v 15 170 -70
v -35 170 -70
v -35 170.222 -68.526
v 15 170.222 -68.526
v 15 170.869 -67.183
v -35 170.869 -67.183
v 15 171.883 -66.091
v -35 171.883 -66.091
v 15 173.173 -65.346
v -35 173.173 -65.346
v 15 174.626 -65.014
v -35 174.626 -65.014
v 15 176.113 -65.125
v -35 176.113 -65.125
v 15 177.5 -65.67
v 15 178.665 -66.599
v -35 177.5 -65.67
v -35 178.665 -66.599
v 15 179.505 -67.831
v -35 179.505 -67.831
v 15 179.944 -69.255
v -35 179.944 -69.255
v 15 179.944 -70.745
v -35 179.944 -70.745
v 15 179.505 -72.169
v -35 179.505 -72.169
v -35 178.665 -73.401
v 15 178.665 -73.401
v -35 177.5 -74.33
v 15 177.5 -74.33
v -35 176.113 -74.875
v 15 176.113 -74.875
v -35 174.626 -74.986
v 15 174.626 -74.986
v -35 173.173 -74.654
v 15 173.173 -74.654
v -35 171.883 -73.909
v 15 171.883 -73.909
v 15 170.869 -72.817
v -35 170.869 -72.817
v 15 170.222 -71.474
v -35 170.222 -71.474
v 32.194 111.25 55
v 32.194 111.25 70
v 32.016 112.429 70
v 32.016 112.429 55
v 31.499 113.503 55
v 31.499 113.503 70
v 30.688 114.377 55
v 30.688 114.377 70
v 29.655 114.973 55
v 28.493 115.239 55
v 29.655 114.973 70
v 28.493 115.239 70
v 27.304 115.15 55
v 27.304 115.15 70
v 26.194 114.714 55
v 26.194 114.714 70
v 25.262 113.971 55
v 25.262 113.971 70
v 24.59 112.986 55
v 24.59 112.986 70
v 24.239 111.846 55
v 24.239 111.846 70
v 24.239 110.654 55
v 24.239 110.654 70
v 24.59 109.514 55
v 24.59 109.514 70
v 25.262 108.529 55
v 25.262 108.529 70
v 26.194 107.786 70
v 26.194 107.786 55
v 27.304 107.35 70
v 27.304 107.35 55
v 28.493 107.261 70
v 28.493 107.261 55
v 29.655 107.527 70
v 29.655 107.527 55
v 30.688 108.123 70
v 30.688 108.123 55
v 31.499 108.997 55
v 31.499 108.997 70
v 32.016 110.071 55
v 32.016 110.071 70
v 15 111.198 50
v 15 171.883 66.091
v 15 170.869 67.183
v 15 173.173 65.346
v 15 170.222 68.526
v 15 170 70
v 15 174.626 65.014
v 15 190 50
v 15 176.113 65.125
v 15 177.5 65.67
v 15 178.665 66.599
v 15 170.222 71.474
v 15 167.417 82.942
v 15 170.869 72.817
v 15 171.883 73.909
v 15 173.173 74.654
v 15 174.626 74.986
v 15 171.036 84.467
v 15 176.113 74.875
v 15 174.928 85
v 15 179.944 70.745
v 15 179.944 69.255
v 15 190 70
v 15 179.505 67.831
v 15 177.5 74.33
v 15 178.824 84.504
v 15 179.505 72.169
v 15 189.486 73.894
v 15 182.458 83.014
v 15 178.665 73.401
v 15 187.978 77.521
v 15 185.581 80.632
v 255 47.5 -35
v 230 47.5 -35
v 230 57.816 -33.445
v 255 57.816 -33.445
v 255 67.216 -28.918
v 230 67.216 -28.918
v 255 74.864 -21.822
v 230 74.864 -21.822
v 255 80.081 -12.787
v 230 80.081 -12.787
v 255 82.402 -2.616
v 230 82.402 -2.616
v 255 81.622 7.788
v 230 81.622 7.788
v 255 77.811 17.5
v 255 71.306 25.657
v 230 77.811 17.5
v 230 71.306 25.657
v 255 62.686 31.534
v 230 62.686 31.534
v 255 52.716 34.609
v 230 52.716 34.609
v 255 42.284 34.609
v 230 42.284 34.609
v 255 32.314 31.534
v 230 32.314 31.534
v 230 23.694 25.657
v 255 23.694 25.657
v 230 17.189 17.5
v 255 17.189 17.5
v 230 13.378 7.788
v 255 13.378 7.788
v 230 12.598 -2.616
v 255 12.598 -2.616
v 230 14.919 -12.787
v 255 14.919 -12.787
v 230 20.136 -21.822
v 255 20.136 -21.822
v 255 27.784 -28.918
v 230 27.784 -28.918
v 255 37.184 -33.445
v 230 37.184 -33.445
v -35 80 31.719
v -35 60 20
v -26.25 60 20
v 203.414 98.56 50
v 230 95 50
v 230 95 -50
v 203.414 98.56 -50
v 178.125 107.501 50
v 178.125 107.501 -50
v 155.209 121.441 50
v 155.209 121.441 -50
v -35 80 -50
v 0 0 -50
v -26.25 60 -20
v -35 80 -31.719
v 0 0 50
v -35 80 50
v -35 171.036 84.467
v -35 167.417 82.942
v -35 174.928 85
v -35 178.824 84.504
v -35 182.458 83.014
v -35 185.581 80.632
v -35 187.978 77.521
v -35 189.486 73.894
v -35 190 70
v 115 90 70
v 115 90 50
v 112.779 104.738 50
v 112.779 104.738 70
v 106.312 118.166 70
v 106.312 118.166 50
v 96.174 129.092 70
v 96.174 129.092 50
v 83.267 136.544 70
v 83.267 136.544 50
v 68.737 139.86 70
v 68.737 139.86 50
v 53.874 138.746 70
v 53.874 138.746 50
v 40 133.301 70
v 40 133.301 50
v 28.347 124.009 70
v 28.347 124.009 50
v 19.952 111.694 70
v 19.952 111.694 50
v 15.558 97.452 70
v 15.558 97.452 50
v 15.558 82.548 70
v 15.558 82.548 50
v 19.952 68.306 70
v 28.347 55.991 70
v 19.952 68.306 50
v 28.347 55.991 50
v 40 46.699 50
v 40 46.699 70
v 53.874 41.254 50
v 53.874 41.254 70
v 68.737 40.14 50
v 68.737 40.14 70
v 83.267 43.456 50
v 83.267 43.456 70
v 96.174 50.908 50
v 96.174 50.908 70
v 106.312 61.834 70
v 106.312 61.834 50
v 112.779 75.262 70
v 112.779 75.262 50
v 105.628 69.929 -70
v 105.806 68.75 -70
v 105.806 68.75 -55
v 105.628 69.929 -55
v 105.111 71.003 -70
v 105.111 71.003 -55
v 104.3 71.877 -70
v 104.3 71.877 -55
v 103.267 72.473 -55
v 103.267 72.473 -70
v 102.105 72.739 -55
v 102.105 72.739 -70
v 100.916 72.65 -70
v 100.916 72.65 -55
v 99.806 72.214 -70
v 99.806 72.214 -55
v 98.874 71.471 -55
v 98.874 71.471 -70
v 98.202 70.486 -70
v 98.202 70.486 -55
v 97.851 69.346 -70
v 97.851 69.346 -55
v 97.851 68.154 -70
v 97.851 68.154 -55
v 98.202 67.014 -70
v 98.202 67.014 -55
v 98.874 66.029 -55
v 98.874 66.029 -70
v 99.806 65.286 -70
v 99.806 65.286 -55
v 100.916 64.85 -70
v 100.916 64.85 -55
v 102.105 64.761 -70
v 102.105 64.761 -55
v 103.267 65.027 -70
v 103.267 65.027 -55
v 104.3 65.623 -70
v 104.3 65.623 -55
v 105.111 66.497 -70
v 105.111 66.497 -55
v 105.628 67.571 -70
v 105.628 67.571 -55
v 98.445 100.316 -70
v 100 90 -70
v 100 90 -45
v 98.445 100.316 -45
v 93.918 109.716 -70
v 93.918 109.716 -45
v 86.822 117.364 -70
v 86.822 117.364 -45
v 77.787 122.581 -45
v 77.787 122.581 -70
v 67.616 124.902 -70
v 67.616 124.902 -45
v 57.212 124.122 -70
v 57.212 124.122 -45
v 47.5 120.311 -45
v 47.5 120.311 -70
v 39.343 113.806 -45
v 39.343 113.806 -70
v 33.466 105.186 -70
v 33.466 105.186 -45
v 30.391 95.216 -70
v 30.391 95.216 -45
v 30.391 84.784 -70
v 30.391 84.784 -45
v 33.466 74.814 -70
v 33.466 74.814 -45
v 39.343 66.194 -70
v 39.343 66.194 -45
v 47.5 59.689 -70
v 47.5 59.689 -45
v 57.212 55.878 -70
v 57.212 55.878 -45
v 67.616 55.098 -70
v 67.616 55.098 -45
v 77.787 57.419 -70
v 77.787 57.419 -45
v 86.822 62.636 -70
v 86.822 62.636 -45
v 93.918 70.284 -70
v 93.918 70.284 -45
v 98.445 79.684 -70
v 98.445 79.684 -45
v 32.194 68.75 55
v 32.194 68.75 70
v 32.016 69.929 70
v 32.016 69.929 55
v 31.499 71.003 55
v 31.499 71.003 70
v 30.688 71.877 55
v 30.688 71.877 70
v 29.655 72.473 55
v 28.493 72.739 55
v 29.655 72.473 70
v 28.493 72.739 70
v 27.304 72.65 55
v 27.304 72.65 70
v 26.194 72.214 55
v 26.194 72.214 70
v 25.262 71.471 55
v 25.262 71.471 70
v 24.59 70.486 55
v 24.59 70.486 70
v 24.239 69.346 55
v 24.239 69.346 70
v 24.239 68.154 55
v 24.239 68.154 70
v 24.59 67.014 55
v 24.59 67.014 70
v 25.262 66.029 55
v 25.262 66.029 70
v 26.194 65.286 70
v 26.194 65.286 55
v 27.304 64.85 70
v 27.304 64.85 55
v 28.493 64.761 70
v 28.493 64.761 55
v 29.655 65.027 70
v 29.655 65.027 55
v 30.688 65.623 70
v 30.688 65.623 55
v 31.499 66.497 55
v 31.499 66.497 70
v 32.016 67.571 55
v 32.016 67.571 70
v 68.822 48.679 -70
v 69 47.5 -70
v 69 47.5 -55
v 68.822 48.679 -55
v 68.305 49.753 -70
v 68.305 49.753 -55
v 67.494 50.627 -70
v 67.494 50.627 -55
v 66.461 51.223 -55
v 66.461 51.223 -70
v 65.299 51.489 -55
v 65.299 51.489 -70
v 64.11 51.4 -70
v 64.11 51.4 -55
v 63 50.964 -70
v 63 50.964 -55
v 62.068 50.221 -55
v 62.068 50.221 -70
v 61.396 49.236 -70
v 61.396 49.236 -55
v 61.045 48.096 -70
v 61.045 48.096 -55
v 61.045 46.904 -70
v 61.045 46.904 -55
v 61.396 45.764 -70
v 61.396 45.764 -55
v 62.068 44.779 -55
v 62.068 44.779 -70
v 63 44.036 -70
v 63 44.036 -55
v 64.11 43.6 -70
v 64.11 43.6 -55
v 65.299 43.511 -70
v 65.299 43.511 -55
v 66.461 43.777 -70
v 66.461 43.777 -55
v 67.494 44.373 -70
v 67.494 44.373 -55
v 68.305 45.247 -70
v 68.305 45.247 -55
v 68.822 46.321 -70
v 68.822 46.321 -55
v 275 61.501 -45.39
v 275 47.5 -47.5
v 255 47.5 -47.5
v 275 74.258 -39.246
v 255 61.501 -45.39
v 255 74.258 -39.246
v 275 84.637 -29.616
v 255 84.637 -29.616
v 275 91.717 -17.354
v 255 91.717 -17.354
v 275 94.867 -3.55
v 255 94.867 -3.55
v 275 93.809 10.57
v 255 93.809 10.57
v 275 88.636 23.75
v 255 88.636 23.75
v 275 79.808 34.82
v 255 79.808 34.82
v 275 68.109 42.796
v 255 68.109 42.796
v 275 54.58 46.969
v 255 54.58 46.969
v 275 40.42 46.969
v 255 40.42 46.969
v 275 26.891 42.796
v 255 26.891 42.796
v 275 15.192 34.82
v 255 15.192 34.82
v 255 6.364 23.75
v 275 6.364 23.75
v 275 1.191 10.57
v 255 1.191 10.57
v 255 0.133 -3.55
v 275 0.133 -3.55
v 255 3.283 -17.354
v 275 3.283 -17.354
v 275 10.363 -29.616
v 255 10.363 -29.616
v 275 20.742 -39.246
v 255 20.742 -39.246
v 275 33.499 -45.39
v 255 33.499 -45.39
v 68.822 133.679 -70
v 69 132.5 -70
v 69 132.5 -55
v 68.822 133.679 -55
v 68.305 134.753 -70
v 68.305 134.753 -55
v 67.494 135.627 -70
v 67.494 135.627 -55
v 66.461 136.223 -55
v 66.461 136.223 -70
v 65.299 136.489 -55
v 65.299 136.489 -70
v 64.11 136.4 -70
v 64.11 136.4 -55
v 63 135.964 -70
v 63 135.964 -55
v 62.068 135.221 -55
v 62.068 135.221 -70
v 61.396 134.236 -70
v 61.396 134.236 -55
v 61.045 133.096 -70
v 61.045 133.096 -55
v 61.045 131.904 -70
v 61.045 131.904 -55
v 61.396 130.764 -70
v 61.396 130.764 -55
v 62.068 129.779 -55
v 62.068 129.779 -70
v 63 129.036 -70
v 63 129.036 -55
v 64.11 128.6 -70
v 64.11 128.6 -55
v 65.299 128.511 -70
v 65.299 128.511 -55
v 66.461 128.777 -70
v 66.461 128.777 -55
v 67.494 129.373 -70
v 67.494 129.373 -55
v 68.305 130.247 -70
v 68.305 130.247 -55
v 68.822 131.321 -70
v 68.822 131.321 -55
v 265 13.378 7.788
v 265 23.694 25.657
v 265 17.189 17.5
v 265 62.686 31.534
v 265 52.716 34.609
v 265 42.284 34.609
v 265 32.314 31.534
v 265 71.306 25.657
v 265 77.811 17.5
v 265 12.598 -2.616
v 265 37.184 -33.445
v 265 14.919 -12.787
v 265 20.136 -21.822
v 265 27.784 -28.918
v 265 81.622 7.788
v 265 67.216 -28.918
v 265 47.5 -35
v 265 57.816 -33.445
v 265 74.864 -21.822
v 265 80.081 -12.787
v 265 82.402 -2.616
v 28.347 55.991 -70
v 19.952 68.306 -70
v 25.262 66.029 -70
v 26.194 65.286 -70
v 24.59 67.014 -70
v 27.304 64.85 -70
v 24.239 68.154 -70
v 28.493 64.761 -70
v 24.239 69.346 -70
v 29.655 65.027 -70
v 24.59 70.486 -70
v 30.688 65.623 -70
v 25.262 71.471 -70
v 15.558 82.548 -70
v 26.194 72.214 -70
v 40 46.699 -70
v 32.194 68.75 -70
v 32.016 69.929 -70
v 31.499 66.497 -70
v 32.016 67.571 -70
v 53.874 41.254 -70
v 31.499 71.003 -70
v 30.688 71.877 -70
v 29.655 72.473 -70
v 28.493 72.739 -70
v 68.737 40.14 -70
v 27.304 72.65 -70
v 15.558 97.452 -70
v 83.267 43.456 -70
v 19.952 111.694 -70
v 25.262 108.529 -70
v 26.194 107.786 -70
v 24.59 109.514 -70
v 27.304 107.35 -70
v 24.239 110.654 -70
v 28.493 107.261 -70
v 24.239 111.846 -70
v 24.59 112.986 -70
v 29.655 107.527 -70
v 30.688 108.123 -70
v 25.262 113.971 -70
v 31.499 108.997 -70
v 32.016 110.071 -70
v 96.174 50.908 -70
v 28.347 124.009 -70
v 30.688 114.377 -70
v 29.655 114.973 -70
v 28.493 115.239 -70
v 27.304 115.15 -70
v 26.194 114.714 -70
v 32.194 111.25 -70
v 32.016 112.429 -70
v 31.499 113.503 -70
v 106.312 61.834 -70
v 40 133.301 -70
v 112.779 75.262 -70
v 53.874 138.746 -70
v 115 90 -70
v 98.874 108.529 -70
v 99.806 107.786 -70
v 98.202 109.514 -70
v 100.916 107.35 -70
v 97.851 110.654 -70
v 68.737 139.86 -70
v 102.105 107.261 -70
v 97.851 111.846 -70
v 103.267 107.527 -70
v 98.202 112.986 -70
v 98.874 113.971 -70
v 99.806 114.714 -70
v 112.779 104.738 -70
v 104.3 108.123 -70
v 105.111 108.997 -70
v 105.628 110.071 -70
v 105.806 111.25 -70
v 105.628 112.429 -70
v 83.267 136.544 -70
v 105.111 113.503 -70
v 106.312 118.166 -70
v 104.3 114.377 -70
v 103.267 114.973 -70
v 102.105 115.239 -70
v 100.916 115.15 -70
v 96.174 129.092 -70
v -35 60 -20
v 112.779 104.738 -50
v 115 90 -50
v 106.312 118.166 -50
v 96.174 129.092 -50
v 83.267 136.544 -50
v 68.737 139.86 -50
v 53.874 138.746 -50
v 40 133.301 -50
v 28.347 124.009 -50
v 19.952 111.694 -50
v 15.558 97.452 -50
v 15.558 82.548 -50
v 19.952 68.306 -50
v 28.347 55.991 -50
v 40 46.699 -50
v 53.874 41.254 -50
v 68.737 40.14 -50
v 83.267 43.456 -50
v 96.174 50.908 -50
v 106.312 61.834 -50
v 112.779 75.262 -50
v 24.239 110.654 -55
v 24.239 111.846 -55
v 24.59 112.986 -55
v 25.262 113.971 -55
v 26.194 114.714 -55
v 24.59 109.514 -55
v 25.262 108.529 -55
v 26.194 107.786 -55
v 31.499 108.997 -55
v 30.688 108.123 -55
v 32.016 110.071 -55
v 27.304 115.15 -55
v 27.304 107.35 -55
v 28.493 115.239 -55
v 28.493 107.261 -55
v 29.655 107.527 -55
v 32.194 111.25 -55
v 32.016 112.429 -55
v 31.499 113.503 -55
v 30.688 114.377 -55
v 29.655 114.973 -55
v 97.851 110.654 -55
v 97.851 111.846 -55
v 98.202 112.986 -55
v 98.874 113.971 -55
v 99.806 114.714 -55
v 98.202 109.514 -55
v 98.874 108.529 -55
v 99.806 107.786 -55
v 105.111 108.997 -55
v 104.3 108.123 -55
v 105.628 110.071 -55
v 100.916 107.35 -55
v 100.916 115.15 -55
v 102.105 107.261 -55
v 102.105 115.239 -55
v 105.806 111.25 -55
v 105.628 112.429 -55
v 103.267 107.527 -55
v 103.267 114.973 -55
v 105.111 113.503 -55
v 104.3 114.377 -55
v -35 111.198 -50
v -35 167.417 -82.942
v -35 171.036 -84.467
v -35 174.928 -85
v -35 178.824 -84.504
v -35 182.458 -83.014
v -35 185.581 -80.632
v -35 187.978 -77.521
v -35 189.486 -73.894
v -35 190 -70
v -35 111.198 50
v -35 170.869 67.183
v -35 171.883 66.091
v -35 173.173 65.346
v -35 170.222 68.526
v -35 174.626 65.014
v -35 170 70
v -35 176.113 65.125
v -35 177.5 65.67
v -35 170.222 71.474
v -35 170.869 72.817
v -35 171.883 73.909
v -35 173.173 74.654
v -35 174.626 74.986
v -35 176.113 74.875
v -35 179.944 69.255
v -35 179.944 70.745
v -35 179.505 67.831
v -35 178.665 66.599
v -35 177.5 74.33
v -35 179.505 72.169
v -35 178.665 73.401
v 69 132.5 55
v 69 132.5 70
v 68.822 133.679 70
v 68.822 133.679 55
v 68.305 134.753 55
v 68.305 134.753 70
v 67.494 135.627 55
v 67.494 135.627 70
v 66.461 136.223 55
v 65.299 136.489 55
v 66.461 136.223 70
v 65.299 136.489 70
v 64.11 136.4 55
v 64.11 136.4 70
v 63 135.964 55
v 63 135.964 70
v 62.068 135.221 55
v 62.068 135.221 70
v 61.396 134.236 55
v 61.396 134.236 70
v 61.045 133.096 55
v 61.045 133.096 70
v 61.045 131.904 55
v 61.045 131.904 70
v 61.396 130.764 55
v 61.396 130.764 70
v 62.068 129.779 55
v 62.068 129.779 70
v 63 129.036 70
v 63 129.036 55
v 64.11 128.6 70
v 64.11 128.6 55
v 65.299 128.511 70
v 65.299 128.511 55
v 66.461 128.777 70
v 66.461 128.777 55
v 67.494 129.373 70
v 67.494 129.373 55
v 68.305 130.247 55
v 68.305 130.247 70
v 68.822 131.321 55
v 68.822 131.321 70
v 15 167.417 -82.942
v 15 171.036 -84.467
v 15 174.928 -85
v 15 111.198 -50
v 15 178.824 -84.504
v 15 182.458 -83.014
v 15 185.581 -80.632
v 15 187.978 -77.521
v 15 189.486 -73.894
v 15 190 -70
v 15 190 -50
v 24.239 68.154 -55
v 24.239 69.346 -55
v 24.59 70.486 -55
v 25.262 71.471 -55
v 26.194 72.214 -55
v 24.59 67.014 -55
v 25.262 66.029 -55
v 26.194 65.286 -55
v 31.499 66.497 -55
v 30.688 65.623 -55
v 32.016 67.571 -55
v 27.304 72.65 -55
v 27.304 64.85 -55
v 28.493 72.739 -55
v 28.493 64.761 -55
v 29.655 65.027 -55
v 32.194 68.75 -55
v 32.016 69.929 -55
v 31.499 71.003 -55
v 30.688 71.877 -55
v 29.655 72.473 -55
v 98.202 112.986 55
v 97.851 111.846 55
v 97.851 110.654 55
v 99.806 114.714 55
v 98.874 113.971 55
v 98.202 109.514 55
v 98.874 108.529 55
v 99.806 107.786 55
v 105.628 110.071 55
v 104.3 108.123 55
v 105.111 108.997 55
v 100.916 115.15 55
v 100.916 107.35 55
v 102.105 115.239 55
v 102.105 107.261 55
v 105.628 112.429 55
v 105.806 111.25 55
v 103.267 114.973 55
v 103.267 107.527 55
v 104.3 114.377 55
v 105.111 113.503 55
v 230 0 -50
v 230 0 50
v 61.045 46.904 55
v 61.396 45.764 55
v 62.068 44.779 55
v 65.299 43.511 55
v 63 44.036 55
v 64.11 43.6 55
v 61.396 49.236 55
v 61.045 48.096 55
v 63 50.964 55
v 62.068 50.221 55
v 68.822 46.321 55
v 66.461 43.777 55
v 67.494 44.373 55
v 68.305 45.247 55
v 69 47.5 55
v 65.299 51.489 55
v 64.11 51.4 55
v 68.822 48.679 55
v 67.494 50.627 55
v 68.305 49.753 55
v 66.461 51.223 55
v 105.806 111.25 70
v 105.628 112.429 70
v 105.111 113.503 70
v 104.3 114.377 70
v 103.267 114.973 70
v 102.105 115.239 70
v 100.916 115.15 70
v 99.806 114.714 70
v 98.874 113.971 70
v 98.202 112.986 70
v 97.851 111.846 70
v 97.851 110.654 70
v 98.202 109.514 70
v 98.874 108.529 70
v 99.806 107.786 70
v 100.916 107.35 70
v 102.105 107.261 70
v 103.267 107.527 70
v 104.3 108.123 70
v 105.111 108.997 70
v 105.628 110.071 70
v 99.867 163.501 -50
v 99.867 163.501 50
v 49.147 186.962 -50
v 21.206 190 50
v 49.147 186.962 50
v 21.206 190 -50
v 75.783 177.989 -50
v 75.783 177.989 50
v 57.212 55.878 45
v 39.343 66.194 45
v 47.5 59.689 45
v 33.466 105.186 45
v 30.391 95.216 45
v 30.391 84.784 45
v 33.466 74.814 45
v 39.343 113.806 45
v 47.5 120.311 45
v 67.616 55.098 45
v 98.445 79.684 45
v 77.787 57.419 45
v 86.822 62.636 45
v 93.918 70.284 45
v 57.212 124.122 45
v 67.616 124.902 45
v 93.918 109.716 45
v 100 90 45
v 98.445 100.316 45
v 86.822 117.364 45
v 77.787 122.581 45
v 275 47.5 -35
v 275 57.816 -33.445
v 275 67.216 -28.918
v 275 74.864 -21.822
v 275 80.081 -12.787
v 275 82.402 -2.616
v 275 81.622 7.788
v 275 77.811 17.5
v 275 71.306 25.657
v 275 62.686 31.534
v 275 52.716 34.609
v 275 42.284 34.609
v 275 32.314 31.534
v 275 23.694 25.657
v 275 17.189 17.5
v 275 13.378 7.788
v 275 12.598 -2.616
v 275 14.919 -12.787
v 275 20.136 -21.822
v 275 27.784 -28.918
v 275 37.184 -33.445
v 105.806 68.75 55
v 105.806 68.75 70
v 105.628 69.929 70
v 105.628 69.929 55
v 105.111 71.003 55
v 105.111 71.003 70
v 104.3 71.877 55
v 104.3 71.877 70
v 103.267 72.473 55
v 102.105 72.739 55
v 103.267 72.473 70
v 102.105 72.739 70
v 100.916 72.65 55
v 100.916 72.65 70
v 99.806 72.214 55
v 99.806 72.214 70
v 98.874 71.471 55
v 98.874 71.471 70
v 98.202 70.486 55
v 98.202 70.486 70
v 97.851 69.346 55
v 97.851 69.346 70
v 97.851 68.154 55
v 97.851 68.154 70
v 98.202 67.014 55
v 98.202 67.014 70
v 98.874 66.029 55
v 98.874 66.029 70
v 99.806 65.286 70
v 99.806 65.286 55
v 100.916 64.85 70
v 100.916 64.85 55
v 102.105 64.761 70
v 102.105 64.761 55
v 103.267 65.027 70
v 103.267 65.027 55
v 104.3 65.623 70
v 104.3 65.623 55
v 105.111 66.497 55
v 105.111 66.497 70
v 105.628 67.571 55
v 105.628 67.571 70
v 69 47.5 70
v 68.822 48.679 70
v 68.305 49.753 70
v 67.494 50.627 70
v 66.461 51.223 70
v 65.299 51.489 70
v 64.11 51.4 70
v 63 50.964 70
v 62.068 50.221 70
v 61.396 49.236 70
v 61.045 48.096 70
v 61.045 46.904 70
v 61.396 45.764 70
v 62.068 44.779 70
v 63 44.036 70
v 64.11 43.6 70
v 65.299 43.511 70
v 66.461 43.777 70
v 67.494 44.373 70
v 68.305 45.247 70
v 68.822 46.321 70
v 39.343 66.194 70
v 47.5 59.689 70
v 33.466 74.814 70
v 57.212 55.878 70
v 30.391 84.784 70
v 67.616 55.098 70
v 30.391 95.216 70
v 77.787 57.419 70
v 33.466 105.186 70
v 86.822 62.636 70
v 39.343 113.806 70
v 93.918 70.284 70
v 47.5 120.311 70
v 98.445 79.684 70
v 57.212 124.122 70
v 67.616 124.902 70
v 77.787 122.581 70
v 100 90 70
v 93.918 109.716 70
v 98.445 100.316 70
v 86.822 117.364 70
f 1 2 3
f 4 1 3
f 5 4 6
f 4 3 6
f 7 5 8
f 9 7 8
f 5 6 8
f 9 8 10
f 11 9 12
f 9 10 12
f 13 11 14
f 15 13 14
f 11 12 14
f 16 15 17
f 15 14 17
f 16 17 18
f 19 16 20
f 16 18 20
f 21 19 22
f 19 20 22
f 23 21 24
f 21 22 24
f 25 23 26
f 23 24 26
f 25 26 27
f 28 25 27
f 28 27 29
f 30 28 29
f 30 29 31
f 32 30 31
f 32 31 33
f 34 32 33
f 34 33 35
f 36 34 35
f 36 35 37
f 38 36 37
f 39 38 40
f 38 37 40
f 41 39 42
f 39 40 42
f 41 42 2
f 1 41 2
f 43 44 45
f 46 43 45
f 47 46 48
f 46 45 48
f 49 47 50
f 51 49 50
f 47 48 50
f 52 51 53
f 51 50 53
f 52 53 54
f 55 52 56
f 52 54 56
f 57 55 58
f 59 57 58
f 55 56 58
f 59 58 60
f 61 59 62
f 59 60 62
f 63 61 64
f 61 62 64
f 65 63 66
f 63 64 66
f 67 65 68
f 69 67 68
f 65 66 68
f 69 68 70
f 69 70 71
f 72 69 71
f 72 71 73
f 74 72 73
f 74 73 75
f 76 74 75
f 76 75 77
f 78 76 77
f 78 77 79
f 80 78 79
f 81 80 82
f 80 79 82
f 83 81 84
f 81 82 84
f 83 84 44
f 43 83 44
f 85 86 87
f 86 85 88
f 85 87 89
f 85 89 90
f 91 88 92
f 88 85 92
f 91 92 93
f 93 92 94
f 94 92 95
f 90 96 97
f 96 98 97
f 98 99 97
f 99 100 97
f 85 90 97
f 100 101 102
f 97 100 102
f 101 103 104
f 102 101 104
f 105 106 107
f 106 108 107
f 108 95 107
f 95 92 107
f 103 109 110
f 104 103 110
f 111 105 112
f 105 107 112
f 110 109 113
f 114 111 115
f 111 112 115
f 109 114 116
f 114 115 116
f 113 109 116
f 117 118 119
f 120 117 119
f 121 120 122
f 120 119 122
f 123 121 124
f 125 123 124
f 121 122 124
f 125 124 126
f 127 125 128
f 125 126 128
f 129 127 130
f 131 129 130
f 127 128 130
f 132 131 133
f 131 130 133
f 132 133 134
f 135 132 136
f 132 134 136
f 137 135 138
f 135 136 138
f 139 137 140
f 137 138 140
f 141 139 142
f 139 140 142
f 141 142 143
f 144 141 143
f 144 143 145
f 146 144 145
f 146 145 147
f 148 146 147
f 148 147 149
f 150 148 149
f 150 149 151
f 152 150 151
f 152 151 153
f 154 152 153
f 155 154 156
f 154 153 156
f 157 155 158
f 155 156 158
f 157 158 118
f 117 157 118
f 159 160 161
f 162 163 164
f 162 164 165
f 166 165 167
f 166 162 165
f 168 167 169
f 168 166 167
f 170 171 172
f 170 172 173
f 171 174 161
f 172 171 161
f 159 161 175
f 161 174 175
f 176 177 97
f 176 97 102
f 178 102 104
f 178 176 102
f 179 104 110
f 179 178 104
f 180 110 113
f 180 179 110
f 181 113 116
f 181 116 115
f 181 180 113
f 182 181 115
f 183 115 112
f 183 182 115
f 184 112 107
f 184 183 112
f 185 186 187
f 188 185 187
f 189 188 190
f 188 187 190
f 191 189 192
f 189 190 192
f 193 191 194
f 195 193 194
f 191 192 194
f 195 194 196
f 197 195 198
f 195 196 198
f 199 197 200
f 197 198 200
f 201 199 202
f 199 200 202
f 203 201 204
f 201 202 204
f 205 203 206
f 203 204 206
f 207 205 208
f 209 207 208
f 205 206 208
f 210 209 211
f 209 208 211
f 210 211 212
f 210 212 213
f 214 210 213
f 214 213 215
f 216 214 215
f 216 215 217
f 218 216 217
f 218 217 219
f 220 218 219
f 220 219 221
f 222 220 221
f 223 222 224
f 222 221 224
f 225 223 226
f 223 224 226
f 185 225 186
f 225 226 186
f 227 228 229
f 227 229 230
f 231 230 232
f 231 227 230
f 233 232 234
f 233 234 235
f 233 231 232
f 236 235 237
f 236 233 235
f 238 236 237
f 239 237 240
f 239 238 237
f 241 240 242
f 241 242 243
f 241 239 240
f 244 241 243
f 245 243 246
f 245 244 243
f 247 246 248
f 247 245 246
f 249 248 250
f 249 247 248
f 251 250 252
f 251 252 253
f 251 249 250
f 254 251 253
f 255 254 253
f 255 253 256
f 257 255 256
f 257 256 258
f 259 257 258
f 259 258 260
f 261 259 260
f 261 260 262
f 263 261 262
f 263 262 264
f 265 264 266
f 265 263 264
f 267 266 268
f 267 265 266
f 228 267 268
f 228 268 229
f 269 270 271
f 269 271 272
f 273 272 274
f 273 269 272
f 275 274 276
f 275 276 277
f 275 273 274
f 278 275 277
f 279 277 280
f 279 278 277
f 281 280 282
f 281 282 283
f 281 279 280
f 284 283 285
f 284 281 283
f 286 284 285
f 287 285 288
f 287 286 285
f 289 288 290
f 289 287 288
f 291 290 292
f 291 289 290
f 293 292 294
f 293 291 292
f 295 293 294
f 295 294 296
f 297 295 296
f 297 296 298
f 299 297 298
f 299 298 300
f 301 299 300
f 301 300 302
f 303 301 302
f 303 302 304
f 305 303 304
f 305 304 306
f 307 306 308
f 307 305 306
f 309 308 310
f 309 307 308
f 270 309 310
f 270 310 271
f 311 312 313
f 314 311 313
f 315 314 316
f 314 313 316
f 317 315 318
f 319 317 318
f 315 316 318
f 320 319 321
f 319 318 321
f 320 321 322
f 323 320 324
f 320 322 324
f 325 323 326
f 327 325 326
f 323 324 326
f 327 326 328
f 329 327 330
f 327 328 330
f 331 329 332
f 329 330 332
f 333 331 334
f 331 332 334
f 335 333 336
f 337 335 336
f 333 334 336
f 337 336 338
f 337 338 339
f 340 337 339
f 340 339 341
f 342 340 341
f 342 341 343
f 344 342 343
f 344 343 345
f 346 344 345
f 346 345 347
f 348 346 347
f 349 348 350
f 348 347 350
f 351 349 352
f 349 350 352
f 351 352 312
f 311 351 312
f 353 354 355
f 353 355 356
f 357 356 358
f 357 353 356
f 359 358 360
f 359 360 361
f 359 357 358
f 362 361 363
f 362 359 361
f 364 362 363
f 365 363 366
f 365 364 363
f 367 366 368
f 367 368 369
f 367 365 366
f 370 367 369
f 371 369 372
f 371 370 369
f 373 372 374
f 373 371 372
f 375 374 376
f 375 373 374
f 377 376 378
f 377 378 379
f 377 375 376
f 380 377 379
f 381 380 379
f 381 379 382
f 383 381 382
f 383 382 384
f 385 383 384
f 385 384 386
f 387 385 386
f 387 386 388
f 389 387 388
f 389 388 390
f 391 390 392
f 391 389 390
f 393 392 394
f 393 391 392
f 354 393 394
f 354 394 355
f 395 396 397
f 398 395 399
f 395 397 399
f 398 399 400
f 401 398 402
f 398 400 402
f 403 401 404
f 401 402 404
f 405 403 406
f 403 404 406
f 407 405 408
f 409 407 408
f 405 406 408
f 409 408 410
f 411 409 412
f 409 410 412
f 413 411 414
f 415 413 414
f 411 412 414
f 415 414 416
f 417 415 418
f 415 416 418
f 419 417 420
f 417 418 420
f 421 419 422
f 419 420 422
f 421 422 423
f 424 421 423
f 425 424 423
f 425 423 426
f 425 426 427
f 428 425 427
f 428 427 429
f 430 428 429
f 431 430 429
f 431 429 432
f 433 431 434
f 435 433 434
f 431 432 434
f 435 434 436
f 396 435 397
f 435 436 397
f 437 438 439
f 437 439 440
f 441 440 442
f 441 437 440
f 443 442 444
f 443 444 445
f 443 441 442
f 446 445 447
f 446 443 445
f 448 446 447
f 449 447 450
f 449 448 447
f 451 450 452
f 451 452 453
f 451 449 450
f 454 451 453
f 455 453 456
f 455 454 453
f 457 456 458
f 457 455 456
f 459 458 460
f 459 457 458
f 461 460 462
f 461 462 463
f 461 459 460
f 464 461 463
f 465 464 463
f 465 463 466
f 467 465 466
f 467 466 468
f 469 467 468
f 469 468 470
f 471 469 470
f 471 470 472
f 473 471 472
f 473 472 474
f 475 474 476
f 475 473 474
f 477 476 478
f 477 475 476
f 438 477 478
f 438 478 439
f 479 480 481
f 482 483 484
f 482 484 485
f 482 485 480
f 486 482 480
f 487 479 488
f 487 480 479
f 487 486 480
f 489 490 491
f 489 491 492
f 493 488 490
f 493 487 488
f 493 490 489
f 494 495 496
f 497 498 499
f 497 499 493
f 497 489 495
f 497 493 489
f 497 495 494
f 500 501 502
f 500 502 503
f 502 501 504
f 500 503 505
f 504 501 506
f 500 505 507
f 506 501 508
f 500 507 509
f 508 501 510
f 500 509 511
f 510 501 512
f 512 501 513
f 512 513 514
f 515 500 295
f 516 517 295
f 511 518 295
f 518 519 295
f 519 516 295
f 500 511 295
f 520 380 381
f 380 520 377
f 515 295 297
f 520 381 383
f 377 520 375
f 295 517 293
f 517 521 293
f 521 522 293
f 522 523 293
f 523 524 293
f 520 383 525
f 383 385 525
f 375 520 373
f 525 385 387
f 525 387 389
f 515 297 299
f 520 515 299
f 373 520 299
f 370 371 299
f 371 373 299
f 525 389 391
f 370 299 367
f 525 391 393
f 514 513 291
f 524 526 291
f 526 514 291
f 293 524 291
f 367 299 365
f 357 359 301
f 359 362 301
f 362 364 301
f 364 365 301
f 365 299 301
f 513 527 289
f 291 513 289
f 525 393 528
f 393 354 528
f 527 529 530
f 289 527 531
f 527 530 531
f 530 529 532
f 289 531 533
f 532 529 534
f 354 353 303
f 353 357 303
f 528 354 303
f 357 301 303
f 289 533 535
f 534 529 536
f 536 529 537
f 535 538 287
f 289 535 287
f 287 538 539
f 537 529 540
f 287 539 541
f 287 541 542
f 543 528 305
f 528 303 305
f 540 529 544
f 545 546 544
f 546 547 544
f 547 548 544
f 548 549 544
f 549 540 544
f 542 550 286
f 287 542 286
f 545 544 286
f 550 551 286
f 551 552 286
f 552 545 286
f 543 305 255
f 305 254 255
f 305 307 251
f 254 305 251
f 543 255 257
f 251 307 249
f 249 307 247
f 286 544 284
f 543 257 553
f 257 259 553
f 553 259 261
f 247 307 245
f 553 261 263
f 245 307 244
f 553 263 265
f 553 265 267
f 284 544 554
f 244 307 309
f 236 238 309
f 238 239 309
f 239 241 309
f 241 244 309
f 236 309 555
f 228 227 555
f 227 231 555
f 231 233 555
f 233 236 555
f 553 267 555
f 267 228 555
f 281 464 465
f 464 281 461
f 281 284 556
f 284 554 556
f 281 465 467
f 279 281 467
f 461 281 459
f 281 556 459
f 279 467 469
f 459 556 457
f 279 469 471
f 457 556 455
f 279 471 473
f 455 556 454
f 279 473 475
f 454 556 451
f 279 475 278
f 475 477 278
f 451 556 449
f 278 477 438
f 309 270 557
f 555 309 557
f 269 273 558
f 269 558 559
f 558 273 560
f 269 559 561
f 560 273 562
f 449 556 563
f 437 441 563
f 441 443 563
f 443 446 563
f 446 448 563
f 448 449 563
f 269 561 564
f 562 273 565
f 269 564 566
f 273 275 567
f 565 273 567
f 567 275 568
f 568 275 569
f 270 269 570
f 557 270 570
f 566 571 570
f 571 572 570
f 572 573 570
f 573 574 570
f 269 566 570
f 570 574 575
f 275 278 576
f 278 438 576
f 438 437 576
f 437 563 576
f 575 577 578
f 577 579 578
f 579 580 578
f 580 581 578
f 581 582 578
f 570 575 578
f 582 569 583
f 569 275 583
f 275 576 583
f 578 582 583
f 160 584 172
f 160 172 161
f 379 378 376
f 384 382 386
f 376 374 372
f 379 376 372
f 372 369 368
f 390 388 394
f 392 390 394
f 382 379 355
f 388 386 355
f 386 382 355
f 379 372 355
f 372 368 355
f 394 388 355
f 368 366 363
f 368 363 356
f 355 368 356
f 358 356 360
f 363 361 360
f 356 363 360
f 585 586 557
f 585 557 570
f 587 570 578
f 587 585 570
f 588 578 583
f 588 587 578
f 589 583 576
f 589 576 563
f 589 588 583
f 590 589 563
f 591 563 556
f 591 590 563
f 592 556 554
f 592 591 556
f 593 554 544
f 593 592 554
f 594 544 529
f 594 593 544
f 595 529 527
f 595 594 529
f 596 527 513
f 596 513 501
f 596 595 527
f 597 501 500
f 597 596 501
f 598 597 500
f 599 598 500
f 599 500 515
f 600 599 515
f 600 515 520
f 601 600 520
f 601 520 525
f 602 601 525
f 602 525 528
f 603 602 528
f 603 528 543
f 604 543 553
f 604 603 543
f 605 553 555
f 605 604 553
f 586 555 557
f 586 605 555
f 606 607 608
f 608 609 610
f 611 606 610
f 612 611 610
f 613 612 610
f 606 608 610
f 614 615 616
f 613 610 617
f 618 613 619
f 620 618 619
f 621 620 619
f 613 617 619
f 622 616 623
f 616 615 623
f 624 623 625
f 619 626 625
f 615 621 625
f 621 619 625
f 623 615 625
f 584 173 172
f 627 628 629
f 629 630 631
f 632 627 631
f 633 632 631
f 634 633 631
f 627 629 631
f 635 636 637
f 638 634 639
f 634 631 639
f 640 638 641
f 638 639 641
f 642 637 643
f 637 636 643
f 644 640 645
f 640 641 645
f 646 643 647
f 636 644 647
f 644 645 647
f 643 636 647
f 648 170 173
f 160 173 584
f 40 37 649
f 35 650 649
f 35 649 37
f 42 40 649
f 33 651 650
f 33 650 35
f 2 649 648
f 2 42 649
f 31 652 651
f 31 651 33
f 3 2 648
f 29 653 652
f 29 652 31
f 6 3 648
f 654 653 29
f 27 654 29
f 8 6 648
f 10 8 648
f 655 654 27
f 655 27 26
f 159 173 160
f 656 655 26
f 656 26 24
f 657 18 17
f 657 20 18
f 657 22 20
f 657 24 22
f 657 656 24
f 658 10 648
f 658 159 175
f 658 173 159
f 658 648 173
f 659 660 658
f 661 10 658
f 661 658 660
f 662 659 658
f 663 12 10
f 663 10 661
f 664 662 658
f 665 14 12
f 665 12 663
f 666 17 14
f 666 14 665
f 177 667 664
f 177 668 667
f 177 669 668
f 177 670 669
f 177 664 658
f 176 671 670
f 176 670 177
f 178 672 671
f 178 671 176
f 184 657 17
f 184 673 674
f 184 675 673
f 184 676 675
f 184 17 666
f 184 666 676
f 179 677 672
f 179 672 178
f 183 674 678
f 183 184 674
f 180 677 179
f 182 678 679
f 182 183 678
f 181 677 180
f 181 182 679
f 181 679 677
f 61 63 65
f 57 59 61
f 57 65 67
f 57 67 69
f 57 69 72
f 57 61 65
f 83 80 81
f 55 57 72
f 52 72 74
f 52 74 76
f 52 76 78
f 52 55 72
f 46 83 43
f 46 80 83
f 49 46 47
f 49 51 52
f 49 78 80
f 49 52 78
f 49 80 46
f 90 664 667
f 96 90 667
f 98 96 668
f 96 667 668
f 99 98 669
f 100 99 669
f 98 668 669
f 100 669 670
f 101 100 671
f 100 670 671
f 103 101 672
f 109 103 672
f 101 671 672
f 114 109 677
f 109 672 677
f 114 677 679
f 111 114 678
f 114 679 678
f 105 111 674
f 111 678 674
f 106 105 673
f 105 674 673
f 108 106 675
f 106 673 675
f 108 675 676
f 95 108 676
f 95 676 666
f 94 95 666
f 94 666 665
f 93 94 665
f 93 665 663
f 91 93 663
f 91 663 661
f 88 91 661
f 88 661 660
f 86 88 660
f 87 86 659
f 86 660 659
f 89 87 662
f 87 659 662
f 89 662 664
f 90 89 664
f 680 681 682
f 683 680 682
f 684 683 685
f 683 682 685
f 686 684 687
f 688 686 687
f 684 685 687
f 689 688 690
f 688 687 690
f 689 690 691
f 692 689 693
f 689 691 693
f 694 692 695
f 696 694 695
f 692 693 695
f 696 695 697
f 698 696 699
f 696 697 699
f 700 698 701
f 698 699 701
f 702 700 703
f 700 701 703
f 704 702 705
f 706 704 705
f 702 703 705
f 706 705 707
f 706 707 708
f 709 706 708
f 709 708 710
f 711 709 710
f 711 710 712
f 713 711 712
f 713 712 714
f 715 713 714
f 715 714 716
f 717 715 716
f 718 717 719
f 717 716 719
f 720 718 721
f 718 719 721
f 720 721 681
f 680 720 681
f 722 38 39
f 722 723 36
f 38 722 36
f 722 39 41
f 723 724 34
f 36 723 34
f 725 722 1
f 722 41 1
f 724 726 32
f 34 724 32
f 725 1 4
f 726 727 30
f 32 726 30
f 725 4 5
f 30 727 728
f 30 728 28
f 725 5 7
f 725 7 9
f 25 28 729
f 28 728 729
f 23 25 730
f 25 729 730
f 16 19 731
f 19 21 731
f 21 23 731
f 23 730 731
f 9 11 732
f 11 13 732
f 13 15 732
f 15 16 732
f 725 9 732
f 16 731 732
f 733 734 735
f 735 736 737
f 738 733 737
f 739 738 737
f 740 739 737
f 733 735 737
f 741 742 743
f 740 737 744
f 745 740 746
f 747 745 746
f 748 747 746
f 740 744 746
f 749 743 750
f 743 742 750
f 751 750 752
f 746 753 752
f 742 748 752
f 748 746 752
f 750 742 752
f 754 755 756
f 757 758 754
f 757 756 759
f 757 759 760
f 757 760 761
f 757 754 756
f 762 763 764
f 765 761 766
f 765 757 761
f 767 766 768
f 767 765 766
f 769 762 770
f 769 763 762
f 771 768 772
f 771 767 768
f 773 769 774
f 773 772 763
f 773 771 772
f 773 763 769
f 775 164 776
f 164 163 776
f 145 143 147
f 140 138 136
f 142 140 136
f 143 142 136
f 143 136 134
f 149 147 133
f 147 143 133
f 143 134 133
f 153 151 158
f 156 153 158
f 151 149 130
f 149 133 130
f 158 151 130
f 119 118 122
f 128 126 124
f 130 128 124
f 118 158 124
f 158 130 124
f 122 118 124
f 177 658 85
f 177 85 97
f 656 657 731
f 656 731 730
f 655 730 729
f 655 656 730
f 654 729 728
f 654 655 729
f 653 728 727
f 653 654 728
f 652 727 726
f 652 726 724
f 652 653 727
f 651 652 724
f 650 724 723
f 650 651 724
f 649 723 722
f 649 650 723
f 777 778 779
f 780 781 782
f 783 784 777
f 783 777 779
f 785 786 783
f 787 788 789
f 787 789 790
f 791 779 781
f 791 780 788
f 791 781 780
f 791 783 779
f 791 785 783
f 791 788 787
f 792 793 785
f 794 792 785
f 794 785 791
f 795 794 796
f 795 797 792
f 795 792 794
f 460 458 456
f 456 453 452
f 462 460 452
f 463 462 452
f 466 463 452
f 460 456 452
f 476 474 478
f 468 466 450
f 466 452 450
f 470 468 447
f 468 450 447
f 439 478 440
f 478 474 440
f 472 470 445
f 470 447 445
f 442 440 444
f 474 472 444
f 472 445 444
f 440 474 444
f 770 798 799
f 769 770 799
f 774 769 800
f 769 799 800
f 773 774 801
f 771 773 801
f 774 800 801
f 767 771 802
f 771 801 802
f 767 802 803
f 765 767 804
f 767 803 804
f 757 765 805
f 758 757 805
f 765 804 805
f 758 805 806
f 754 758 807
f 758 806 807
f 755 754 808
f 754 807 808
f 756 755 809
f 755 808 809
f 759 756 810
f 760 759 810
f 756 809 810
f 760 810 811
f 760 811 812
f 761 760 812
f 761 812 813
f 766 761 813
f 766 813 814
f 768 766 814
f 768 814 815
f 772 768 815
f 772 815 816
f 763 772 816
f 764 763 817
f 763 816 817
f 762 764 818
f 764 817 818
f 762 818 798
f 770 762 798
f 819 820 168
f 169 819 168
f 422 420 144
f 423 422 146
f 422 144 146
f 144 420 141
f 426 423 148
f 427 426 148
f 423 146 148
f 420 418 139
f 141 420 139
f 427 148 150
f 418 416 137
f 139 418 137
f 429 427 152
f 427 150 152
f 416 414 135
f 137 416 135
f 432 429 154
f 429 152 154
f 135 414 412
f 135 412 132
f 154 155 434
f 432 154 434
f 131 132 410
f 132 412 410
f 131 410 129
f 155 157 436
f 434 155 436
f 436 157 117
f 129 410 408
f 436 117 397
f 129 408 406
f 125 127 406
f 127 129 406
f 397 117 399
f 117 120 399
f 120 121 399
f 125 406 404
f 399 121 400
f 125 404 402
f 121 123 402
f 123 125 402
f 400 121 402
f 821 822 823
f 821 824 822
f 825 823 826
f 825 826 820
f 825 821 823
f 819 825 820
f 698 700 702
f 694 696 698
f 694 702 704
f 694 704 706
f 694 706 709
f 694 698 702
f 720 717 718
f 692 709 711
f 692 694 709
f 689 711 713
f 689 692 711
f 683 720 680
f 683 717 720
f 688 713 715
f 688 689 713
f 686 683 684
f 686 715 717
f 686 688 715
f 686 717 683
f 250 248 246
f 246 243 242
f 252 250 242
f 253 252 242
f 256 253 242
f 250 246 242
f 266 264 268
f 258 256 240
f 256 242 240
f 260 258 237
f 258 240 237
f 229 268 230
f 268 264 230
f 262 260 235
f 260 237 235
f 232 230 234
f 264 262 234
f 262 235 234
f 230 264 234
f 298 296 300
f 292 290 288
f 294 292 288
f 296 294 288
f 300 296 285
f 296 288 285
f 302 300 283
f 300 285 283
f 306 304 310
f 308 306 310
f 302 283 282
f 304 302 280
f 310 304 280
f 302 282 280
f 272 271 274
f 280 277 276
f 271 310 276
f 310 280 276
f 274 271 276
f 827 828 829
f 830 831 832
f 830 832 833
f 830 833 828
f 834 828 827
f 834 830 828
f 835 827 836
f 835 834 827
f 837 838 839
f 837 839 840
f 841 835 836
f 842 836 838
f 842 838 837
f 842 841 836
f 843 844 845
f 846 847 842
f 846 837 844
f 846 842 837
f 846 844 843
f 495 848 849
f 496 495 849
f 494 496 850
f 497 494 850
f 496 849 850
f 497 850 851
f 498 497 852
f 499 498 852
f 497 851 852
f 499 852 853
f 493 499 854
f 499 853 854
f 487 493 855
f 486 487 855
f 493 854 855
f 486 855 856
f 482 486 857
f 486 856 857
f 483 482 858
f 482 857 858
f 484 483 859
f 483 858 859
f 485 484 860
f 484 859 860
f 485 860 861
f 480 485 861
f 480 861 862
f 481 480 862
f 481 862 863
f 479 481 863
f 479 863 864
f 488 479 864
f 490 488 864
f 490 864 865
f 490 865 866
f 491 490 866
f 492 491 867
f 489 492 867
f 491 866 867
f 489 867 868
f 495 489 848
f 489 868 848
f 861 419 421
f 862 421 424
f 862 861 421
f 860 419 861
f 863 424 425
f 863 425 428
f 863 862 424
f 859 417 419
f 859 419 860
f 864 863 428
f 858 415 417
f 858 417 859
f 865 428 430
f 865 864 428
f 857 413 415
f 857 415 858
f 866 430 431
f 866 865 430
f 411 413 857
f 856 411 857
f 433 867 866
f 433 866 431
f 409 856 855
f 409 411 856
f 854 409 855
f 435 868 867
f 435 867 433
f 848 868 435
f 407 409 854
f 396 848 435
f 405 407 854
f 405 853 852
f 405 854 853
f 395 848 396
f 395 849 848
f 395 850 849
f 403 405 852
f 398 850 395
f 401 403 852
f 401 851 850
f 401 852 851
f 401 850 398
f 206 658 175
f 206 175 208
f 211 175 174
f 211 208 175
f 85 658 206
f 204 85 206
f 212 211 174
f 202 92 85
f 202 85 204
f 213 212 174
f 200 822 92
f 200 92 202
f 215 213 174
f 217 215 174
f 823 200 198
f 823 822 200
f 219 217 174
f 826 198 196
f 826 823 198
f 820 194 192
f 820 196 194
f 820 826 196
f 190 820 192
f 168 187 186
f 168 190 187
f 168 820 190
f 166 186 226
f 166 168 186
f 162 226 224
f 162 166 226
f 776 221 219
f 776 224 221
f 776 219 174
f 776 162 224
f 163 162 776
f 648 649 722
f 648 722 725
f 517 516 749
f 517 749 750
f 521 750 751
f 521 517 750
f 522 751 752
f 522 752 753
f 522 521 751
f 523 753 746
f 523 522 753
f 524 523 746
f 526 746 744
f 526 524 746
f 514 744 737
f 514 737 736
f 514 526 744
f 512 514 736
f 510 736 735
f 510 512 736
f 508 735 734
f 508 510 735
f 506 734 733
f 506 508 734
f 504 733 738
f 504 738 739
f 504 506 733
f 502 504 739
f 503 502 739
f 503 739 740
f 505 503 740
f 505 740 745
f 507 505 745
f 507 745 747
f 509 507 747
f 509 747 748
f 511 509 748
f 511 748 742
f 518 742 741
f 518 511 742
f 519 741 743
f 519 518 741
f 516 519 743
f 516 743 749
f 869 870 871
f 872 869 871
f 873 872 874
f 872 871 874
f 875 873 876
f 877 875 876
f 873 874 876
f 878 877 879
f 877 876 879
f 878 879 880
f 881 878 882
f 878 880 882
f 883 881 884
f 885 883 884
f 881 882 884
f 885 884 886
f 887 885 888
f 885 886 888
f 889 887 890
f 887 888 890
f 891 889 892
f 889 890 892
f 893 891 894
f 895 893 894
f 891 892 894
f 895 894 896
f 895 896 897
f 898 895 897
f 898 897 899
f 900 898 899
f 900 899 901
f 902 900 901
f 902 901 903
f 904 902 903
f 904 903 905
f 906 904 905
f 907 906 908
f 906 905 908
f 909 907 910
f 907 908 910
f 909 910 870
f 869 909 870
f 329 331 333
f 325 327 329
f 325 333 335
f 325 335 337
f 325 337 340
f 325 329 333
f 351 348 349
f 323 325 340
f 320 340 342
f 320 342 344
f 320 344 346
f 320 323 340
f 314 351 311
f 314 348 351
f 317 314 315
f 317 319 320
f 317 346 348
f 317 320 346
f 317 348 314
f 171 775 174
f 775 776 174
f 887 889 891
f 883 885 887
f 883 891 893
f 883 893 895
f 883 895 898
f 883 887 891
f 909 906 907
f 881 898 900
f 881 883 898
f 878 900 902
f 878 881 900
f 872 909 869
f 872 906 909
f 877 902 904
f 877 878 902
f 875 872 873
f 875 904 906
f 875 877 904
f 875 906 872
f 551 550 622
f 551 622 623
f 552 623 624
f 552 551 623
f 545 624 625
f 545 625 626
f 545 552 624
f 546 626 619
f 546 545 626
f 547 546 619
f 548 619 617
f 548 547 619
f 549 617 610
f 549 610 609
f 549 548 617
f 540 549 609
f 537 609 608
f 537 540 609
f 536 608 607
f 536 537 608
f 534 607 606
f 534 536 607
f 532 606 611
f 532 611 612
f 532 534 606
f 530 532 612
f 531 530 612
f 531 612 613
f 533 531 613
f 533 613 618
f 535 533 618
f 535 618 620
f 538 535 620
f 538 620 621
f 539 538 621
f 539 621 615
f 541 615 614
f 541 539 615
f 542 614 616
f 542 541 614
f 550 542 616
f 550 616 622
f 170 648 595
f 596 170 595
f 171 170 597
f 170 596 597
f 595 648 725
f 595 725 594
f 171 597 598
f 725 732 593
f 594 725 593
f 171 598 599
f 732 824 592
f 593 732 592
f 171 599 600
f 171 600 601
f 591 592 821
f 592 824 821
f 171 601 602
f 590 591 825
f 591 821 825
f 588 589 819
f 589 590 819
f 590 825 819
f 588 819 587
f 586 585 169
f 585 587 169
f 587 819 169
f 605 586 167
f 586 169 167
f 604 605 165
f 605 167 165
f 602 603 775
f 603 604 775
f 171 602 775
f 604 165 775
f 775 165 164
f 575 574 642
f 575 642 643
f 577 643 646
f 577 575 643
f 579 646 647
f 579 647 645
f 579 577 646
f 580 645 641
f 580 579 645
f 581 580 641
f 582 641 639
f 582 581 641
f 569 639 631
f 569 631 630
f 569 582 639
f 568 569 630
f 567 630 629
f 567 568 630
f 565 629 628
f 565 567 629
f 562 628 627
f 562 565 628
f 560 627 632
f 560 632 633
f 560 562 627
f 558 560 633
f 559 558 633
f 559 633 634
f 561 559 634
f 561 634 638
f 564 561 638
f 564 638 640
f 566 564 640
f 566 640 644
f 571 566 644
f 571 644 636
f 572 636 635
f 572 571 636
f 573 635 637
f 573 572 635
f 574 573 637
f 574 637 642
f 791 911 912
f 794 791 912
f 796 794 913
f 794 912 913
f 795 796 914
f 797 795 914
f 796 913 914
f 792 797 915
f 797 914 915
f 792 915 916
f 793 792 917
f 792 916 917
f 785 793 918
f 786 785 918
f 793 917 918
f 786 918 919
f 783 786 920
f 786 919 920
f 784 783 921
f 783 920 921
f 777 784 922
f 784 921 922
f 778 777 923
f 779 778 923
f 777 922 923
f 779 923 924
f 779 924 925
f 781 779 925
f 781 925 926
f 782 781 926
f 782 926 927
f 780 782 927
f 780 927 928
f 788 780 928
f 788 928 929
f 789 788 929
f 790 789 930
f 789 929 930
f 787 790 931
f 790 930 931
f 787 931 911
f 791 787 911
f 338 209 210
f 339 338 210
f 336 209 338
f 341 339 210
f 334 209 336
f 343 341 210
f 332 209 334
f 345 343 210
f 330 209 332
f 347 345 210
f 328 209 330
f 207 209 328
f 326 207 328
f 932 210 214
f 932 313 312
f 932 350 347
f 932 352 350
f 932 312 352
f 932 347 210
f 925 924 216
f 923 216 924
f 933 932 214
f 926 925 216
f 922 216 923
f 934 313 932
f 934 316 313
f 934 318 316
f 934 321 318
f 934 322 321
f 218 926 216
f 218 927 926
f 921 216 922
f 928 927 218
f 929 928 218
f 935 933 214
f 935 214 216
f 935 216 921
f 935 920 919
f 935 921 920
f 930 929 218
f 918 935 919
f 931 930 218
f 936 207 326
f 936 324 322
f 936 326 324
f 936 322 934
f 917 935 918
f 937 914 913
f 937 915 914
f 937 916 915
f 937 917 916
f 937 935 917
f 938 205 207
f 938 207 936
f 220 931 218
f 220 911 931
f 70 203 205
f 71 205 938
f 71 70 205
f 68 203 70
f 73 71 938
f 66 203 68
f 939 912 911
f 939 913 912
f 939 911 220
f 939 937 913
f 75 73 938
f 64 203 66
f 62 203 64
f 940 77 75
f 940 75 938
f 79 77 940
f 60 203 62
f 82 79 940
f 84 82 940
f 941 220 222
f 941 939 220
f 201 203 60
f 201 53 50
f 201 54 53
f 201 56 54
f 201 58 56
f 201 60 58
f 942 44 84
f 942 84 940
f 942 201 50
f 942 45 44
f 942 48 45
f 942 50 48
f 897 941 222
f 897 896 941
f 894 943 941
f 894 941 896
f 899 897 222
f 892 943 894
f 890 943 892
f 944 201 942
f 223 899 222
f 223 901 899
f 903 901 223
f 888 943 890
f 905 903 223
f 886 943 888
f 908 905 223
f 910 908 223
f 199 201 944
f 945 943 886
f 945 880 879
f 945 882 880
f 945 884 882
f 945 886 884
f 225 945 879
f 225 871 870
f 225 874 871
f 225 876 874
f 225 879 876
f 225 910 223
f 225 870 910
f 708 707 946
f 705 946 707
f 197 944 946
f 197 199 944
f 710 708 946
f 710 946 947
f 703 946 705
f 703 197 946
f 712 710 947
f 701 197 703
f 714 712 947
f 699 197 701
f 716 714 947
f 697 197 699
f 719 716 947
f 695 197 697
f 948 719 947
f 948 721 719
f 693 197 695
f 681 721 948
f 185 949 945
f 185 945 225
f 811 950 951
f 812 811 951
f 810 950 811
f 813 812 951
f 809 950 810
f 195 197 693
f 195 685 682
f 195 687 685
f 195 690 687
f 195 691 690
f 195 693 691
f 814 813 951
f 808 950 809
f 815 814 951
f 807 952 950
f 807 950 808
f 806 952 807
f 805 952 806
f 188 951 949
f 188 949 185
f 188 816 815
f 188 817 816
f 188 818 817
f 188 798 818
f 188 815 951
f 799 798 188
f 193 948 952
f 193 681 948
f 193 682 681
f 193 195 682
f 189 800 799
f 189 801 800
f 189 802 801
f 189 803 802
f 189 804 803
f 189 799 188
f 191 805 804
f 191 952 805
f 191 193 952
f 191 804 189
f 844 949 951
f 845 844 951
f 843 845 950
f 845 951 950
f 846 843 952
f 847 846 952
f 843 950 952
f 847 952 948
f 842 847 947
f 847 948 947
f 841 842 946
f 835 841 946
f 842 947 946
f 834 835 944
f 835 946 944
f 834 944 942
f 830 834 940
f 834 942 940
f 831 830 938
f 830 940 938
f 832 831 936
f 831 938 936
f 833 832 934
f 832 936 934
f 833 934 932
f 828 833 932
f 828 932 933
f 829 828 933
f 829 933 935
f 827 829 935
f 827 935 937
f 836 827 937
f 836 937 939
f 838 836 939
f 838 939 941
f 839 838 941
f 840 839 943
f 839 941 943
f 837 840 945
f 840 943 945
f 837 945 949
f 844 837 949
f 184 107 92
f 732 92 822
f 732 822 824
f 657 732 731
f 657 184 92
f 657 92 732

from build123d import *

# Parameters (mm, degrees)
DODANIE_WYCI_GNI_CIE1_DEPTH = 50
SZKIC2_R                    = 35
DODANIE_WYCI_GNI_CIE2_DEPTH = 25
SZKIC3_R                    = 47.5
DODANIE_WYCI_GNI_CIE3_DEPTH = 20
SZKIC7_R                    = 50
DODANIE_WYCI_GNI_CIE5_DEPTH = 20
SZKIC8_R                    = 35
WYTNIJ_WYCI_GNI_CIE1_DEPTH  = 25
SZKIC9_R                    = 4
WYTNIJ_WYCI_GNI_CIE2_DEPTH  = 15
SZKIC12_R                   = 5
DODANIE_WYCI_GNI_CIE6_DEPTH = 50
ZAOKR_GLENIE2_R             = 130
ZAOKR_GLENIE3_R             = 130
SZKIC4_R                    = 35
WYTNIJ_WYCI_GNI_CIE3_DEPTH  = 10


with BuildPart() as part:
    # Szkic1 → Dodanie-wyciągnięcie1 (new, symmetric)
    with BuildSketch(Plane.XY):
        Polygon((-35, 190), (65, 190), (190, 95), (230, 95), (230, 0), (0, 0), (-35, 80), align=None)
    extrude(amount=DODANIE_WYCI_GNI_CIE1_DEPTH, both=True)

    # Szkic7 → Dodanie-wyciągnięcie5 (add)
    with BuildSketch(Plane.XY.offset(50)):
        with Locations((65, 90)):
            Circle(SZKIC7_R)
    dodanie_wyci_gni_cie5 = extrude(amount=DODANIE_WYCI_GNI_CIE5_DEPTH)

    # Szkic8 → Wytnij-wyciągnięcie1 (cut)
    with BuildSketch(Plane.XY.offset(70)):
        with Locations((65, 90)):
            Circle(SZKIC8_R)
    wytnij_wyci_gni_cie1 = extrude(amount=-WYTNIJ_WYCI_GNI_CIE1_DEPTH, mode=Mode.SUBTRACT)

    # Szkic9 → Wytnij-wyciągnięcie2 (cut)
    with BuildSketch(Plane.XY.offset(70)):
        with Locations((65, 132.5)):
            Circle(SZKIC9_R)
        with Locations((101.806079661, 111.25)):
            Circle(SZKIC9_R)
        with Locations((101.806079661, 68.75)):
            Circle(SZKIC9_R)
        with Locations((65, 47.5)):
            Circle(SZKIC9_R)
        with Locations((28.193920339, 68.75)):
            Circle(SZKIC9_R)
        with Locations((28.193920339, 111.25)):
            Circle(SZKIC9_R)
    wytnij_wyci_gni_cie2 = extrude(amount=-WYTNIJ_WYCI_GNI_CIE2_DEPTH, mode=Mode.SUBTRACT)

    # Szkic12 → Dodanie-wyciągnięcie6 (add)
    # profile 1 of 6: a face of its own
    with BuildSketch(Plane.ZY.offset(35)):
        with BuildLine():
            Line((-50, 190), (-70, 190))
            ThreePointArc((-70, 190), (-83.014439461, 182.458174409), (-82.941861244, 167.416582068))
            Line((-82.941861244, 167.416582068), (-50, 111.198000795))
            Line((-50, 111.198000795), (-50, 190))
        make_face()
        with Locations(Location((-70, 175, 0), (0, 0, 270))):
            Circle(SZKIC12_R, mode=Mode.SUBTRACT)
    # profile 2 of 6: a face of its own
    with BuildSketch(Plane.ZY.offset(35)):
        Polygon((0, 190), (-50, 190), (-50, 111.198000795), (-31.7192076, 80), (0, 80), align=None)
    # profile 3 of 6: a face of its own
    with BuildSketch(Plane.ZY.offset(35)):
        Polygon((50, 190), (0, 190), (0, 80), (31.7192076, 80), (50, 111.198000795), align=None)
    # profile 4 of 6: a face of its own
    with BuildSketch(Plane.ZY.offset(35)):
        with BuildLine():
            Line((70, 190), (50, 190))
            Line((50, 190), (50, 111.198000795))
            Line((50, 111.198000795), (82.941861244, 167.416582068))
            ThreePointArc((82.941861244, 167.416582068), (83.014439461, 182.458174409), (70, 190))
        make_face()
        with Locations(Location((70, 175, 0), (0, 0, 270))):
            Circle(SZKIC12_R, mode=Mode.SUBTRACT)
    # profile 5 of 6: a face of its own
    with BuildSketch(Plane.ZY.offset(35)):
        Polygon((31.7192076, 80), (0, 80), (0, 60), (20, 60), align=None)
    # profile 6 of 6: a face of its own
    with BuildSketch(Plane.ZY.offset(35)):
        Polygon((0, 60), (0, 80), (-31.7192076, 80), (-20, 60), align=None)
    extrude(amount=-DODANIE_WYCI_GNI_CIE6_DEPTH)

    # Lustro1: Dodanie-wyciągnięcie5, Wytnij-wyciągnięcie1, Wytnij-wyciągnięcie2 across plane
    add(dodanie_wyci_gni_cie5.mirror(Plane.XY))
    add(wytnij_wyci_gni_cie1.mirror(Plane.XY), mode=Mode.SUBTRACT)
    add(wytnij_wyci_gni_cie2.mirror(Plane.XY), mode=Mode.SUBTRACT)

    # Zaokrąglenie2
    zaokr_glenie2_edges = [part.edges().sort_by_distance(p)[0] for p in [
        (65, 190, 0),
    ]]
    fillet(zaokr_glenie2_edges, radius=ZAOKR_GLENIE2_R)

    # Zaokrąglenie3
    # the kernel refuses this fillet: 130 mm, written as the material it adds along each edge
    with BuildSketch(Plane(origin=(190, 95, 50), x_dir=(-0.7961621941231027, 0.6050832675335577, 0), z_dir=(0, 0, -1))) as zaokr_glenie3_piece_1:
        with BuildLine():
            CenterArc((43.698629651, 130), ZAOKR_GLENIE3_R, 234.470905265, 35.529094735)
            Line((-31.846487765, 24.203330701), (-33.357390113, 22.087397315))
            ThreePointArc((-33.357390113, 22.087397315), (-17.496460378, 10.031643646), (-1.573216496, -2.070021705))
            Line((-1.573216496, -2.070021705), (0, -2.6))
            Line((0, -2.6), (43.698629651, -2.6))
            Line((43.698629651, -2.6), (43.698629651, 0))
        make_face()
    extrude(amount=100)


with BuildPart() as body_2:
    # Szkic2 → Dodanie-wyciągnięcie2 (new body)
    with BuildSketch(Plane(origin=(230, 0, 0), x_dir=(0, 0, -1), z_dir=(1, 0, 0))):
        with Locations((0, 47.5)):
            Circle(SZKIC2_R)
    extrude(amount=DODANIE_WYCI_GNI_CIE2_DEPTH)

    # Szkic3 → Dodanie-wyciągnięcie3 (add)
    with BuildSketch(Plane(origin=(255, 0, 0), x_dir=(0, 0, -1), z_dir=(1, 0, 0))):
        with Locations((0, 47.5)):
            Circle(SZKIC3_R)
    extrude(amount=DODANIE_WYCI_GNI_CIE3_DEPTH)

    # Szkic4 → Wytnij-wyciągnięcie3 (cut)
    with BuildSketch(Plane(origin=(275, 0, 0), x_dir=(0, 0, -1), z_dir=(1, 0, 0))):
        with Locations((0, 47.5)):
            Circle(SZKIC4_R)
    extrude(amount=-WYTNIJ_WYCI_GNI_CIE3_DEPTH, mode=Mode.SUBTRACT)


solid = Compound([part.part, body_2.part])
